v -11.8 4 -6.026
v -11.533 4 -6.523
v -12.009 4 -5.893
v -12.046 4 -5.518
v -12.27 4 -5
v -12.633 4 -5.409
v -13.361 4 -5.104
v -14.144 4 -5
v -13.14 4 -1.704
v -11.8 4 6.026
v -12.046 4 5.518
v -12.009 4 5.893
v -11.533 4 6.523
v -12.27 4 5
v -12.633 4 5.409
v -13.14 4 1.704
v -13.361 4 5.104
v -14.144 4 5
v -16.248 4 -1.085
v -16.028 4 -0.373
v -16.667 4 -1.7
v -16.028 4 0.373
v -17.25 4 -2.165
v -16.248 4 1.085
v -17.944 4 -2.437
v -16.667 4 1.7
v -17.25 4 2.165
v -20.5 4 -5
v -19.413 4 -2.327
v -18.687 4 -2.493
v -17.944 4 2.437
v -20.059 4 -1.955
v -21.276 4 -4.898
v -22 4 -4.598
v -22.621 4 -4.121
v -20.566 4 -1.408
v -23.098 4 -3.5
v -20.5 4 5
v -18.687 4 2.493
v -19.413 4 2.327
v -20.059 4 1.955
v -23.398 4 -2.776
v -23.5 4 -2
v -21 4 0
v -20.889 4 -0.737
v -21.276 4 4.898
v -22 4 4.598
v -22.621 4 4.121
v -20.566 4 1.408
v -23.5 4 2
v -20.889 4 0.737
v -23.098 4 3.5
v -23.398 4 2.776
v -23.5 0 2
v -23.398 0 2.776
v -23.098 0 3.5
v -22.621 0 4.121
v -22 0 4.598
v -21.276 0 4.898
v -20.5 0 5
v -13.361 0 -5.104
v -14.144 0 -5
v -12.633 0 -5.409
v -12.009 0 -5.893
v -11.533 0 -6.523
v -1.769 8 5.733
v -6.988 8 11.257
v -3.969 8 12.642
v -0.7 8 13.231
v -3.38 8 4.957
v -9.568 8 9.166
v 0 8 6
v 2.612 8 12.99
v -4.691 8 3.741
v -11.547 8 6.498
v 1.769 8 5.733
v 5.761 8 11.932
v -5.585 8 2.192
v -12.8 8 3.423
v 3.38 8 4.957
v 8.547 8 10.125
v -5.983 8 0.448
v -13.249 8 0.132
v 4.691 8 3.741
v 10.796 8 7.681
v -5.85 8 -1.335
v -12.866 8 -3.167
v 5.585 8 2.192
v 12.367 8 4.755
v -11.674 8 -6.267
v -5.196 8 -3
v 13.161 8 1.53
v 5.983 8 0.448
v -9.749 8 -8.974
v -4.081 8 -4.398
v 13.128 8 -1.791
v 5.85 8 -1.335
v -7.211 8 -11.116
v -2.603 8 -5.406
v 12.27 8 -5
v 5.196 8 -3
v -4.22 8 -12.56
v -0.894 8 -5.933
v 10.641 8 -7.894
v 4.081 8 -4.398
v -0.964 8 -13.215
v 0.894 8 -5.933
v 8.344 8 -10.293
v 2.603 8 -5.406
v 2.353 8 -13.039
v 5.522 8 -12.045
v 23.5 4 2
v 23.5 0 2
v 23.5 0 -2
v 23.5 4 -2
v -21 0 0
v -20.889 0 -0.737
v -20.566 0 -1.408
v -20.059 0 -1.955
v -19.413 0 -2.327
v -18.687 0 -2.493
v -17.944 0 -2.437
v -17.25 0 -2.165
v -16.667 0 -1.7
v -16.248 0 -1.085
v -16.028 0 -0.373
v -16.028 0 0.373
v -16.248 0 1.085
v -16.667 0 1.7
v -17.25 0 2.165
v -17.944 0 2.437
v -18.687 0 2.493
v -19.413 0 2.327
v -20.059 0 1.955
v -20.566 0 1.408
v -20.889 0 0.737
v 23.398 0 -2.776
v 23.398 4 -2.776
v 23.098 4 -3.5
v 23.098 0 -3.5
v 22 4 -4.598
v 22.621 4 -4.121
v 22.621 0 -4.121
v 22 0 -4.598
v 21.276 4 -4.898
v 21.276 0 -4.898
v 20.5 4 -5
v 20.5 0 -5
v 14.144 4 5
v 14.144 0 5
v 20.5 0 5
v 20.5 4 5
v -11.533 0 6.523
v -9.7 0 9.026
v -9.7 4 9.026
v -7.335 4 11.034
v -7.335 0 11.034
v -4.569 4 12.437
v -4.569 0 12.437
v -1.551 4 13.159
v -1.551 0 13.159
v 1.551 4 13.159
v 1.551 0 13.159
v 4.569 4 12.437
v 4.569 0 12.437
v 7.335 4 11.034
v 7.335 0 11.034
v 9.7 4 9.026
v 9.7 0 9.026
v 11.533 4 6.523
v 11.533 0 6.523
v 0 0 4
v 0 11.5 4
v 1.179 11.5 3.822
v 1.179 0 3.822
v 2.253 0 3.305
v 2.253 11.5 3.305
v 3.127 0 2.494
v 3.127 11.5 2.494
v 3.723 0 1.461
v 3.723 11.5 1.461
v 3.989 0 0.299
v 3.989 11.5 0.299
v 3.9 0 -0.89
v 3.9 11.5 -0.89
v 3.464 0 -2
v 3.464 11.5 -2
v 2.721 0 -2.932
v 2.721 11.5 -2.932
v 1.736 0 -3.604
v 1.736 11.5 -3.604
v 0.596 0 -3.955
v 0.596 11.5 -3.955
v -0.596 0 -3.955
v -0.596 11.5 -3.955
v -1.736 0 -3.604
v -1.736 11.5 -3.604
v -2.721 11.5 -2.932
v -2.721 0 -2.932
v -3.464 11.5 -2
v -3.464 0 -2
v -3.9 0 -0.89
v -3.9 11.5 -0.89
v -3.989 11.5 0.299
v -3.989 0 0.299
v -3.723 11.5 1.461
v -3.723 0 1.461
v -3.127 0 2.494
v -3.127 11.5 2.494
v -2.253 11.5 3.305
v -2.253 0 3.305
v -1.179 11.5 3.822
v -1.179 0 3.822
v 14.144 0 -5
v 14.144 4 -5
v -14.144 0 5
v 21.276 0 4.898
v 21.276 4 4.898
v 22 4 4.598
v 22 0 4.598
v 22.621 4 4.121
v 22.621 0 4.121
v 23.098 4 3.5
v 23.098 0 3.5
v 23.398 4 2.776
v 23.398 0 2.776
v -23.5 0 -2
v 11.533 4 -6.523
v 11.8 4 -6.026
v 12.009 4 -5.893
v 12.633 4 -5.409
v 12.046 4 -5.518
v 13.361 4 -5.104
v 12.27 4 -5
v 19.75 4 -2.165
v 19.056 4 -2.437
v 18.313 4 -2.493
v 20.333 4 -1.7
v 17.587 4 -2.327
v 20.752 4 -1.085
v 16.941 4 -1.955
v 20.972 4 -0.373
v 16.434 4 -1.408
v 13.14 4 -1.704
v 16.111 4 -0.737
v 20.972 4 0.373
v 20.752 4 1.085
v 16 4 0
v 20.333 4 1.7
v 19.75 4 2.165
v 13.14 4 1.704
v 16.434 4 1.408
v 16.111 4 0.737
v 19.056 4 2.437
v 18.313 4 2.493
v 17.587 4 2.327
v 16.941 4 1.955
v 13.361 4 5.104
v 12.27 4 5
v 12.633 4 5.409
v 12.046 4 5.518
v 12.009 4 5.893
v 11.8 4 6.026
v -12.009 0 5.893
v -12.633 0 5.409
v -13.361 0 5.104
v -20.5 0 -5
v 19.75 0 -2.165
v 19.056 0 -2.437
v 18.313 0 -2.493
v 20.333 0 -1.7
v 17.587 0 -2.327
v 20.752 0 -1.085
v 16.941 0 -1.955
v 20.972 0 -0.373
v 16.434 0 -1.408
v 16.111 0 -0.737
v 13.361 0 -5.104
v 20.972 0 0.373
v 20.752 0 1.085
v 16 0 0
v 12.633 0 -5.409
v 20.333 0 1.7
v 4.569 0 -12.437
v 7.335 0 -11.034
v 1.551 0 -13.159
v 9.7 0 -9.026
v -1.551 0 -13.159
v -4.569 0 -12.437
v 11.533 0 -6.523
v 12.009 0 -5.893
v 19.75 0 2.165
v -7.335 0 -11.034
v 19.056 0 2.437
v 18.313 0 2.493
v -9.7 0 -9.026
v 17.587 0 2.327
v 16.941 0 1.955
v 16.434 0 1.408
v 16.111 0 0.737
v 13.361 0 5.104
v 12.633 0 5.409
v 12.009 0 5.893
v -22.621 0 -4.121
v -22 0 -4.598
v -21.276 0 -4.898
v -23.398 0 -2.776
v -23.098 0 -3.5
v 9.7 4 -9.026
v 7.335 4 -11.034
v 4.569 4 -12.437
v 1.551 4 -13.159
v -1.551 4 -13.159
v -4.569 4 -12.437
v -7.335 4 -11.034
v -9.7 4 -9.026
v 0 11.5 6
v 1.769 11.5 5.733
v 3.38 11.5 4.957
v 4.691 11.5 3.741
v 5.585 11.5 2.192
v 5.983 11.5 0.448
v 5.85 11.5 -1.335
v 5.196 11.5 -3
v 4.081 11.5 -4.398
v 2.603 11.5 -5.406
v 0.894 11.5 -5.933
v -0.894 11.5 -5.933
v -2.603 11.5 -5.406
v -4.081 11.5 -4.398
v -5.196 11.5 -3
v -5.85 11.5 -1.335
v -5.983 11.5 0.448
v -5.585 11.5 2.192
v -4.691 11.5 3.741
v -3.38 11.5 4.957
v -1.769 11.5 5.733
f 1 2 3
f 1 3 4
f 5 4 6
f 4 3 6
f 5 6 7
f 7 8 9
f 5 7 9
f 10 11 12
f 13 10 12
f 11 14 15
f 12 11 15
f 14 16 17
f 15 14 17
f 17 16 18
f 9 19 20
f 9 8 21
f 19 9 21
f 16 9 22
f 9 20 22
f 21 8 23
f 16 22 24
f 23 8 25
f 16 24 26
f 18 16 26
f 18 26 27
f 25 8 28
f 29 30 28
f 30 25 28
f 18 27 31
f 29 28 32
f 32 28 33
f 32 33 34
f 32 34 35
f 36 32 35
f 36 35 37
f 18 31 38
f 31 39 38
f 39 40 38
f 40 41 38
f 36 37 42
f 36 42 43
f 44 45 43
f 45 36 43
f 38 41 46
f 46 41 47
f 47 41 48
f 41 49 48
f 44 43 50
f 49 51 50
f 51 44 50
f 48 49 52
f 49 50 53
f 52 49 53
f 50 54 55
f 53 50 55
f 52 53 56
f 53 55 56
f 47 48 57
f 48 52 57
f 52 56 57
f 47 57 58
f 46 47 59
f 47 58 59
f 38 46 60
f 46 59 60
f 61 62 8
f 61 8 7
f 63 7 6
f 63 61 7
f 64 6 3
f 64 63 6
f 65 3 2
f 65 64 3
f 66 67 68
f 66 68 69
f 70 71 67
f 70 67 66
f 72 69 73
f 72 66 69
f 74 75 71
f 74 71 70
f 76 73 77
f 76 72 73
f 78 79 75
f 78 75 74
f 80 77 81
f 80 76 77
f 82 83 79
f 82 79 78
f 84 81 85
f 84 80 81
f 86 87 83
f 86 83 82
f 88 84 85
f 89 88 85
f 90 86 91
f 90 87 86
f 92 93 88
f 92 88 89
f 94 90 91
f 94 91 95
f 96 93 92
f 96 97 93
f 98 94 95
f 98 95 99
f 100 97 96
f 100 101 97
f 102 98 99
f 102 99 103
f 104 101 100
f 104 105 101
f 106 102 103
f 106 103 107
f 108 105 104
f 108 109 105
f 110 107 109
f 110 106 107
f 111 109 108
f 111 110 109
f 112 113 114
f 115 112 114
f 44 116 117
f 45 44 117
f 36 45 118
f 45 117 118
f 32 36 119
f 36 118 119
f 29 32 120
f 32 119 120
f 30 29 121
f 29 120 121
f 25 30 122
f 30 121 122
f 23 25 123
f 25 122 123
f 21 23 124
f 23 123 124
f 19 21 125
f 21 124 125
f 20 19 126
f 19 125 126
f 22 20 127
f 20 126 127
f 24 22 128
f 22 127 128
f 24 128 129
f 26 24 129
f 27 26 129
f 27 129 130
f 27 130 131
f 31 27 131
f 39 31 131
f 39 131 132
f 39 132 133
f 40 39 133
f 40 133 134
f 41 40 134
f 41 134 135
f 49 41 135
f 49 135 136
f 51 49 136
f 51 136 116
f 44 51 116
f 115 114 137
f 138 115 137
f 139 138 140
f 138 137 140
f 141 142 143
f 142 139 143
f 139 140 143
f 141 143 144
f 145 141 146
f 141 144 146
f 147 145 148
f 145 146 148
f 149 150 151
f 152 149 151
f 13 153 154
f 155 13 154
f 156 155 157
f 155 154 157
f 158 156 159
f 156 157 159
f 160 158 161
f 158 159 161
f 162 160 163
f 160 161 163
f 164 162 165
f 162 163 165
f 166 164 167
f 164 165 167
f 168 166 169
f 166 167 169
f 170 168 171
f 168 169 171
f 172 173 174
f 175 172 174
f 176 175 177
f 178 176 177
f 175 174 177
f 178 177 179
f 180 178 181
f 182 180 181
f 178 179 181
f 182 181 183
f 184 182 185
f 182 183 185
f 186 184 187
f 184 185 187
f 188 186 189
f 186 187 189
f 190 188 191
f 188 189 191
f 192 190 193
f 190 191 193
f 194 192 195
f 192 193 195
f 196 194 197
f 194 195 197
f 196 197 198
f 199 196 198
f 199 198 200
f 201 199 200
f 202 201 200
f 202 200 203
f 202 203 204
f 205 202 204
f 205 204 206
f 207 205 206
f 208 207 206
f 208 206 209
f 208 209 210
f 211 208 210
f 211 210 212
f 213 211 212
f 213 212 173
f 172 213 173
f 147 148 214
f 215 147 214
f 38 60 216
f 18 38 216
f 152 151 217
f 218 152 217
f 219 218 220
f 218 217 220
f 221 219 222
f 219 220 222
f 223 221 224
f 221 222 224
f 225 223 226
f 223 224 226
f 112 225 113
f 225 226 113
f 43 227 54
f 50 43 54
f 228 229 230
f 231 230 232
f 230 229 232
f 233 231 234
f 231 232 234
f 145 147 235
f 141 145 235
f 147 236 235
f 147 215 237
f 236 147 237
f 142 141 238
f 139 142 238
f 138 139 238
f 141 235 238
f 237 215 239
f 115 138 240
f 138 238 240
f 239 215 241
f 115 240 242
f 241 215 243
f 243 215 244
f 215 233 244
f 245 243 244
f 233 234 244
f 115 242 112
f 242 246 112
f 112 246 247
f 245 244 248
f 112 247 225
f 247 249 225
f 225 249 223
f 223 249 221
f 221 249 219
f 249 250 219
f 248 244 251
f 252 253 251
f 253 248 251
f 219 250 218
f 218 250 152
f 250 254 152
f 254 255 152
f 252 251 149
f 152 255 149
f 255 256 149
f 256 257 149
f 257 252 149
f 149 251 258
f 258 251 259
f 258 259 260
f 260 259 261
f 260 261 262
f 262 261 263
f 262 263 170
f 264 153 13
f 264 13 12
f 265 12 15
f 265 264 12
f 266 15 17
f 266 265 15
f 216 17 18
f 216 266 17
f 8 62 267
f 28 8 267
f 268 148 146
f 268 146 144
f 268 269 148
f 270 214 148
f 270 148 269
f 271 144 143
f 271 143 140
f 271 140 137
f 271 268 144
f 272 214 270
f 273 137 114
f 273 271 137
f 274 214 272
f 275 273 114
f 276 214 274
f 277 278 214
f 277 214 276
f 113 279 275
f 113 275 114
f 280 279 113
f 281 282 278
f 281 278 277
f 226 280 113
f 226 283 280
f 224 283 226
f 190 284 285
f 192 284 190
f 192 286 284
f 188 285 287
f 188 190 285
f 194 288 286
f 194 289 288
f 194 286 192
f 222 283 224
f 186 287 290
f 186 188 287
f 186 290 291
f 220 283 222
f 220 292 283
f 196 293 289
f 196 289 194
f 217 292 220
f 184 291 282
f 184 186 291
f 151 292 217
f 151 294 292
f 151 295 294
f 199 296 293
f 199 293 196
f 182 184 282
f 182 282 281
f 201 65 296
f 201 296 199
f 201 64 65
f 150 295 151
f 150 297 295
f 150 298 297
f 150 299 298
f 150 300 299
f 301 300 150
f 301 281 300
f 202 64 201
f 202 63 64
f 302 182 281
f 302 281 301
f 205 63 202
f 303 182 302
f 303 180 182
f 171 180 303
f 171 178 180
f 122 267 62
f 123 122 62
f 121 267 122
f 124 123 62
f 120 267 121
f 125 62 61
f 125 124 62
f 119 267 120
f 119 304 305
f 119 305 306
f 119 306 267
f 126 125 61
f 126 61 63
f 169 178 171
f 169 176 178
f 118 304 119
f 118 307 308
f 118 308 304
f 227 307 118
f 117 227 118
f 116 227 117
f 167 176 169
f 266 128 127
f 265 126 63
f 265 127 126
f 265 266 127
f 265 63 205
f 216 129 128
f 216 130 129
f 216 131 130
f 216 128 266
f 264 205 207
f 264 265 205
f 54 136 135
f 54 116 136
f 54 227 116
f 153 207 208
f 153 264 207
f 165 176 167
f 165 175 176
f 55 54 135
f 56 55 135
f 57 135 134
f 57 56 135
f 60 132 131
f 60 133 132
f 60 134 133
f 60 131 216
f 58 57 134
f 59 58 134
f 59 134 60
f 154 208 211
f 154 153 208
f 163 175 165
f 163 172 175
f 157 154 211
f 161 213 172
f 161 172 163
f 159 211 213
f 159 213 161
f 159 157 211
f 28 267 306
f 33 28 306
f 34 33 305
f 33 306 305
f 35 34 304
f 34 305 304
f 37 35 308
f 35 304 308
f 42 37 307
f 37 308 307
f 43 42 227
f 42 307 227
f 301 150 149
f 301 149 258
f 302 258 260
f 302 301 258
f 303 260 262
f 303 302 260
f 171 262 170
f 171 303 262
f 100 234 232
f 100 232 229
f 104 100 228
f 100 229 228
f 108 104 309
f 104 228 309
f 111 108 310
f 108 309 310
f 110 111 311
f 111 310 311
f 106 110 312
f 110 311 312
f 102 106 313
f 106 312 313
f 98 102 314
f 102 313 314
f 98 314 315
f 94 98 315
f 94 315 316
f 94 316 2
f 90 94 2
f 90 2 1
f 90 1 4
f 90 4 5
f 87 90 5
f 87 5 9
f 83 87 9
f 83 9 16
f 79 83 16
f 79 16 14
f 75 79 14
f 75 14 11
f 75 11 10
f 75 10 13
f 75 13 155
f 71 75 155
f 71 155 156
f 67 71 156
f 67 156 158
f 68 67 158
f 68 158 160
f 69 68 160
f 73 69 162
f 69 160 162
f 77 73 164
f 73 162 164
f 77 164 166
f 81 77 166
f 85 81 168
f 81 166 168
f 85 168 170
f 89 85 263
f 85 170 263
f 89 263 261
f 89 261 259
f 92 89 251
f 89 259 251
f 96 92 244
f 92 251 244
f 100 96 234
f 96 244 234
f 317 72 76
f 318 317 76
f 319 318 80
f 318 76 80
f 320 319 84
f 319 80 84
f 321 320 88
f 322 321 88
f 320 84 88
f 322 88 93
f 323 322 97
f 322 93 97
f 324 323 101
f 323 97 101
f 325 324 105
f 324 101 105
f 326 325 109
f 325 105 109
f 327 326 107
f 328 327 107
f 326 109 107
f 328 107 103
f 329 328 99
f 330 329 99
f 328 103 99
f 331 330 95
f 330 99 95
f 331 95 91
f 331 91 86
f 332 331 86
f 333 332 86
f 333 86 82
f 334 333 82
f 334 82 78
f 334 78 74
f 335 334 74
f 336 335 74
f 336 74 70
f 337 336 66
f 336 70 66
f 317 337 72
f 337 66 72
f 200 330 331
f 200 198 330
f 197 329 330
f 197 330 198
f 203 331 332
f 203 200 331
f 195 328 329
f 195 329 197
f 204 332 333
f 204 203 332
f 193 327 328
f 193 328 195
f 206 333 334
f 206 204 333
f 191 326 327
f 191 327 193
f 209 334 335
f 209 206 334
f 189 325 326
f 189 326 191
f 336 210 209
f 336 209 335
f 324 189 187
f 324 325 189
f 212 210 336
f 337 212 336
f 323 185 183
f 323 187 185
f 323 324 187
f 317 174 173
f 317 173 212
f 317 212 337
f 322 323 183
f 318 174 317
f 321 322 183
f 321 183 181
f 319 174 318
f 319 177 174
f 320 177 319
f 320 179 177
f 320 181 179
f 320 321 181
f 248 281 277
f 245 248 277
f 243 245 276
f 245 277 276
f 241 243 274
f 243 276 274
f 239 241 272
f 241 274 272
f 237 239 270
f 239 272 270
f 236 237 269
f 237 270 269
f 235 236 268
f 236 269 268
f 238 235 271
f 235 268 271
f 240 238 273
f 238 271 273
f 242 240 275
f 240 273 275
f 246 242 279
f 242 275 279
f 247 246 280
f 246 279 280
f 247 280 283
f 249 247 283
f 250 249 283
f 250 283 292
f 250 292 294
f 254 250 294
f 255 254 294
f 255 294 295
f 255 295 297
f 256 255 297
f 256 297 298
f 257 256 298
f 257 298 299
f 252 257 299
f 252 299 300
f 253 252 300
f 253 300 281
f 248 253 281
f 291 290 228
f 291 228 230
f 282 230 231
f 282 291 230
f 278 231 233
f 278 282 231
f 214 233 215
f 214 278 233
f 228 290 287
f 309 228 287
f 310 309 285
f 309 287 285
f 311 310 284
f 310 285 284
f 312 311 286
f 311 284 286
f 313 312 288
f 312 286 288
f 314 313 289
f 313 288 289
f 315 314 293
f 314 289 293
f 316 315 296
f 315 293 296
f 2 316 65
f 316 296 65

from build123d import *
from build123d.topology import SkipClean

# Parameters (mm, degrees)
EXTRUDE_1_DEPTH     = 4
SKETCH_2_R          = 13.25
EXTRUDE_2_DEPTH     = 4
SKETCH_3_R          = 6
EXTRUDE_3_DEPTH     = 3.5
CUT_EXTRUDE_1_REACH = 31.327
SKETCH_4_R          = 4
FILLET_1_R          = 3
HOLE_WIZARD_1_D     = 5


with BuildPart() as part:
    # 草图1 → 凸台-拉伸1 (new body)
    with BuildSketch(Plane(origin=(0, 0, 0), x_dir=(1, 0, 0), z_dir=(0, 1, 0))):
        with BuildLine():
            Line((-3, 5), (-12.270391192, 5))
            ThreePointArc((-12.270391192, 5), (-13.25, 0), (-12.270391192, -5))
            Line((-12.270391192, -5), (-3, -5))
            Line((-3, -5), (-3, 5))
        make_face()
        with BuildLine():
            Line((-12.270391192, 5), (-23.5, 5))
            Line((-23.5, 5), (-23.5, -5))
            Line((-23.5, -5), (-12.270391192, -5))
            ThreePointArc((-12.270391192, -5), (-13.25, 0), (-12.270391192, 5))
        make_face()
        with BuildLine():
            ThreePointArc((12.270391192, 5), (0, 13.25), (-12.270391192, 5))
            Line((-12.270391192, 5), (-3, 5))
            Line((-3, 5), (-3, -5))
            Line((-3, -5), (-12.270391192, -5))
            ThreePointArc((-12.270391192, -5), (0, -13.25), (12.270391192, -5))
            Line((12.270391192, -5), (3, -5))
            Line((3, -5), (3, 5))
            Line((3, 5), (12.270391192, 5))
        make_face()
        with BuildLine():
            ThreePointArc((13.25, 0), (13.002791687, 2.547529853), (12.270391192, 5))
            Line((12.270391192, 5), (3, 5))
            Line((3, 5), (3, -5))
            Line((3, -5), (12.270391192, -5))
            ThreePointArc((12.270391192, -5), (13.002791687, -2.547529853), (13.25, 0))
        make_face()
        with BuildLine():
            Line((23.5, 5), (12.270391192, 5))
            ThreePointArc((12.270391192, 5), (13.002791687, 2.547529853), (13.25, 0))
            ThreePointArc((13.25, 0), (13.002791687, -2.547529853), (12.270391192, -5))
            Line((12.270391192, -5), (23.5, -5))
            Line((23.5, -5), (23.5, 5))
        make_face()
    extrude(amount=EXTRUDE_1_DEPTH)

    # 草图2 → 凸台-拉伸2 (add)
    with BuildSketch(Plane(origin=(0, 4, 0), x_dir=(1, 0, 0), z_dir=(0, 1, 0))):
        with Locations(Location((0, 0, 0), (0, 0, 22.170157164))):
            Circle(SKETCH_2_R)
    extrude(amount=EXTRUDE_2_DEPTH)

    # 草图3 → 凸台-拉伸3 (add)
    with SkipClean():  # the faces are left unmerged after this step: merging them gives an invalid solid
        with BuildSketch(Plane(origin=(0, 8, 0), x_dir=(1, 0, 0), z_dir=(0, 1, 0))):
            with Locations(Location((0, 0, 0), (0, 0, 270))):
                Circle(SKETCH_3_R)
        extrude(amount=EXTRUDE_3_DEPTH)

    # 草图4 → 切除-拉伸1 (cut, up to next)
    with BuildSketch(Plane(origin=(0, 11.5, 0), x_dir=(1, 0, 0), z_dir=(0, 1, 0)), mode=Mode.PRIVATE) as cut_extrude_1_sk1:
        with Locations(Location((0, 0, 0), (0, 0, 270))):
            Circle(SKETCH_4_R)
    cut_extrude_1_tool1 = extrude(cut_extrude_1_sk1.sketch, amount=-CUT_EXTRUDE_1_REACH, mode=Mode.PRIVATE) & part.part
    add(cut_extrude_1_tool1.solids().sort_by_distance((0, 11.5, 0))[0], mode=Mode.SUBTRACT)

    # 圆角1
    # the kernel refuses this fillet: 3 mm, written as the material it adds along each edge
    with BuildSketch(Plane(origin=(-12.270391192, 0, 5), x_dir=(-1, 0, 0), z_dir=(0, 1, 0))) as fillet_1_piece_1:
        with BuildLine():
            CenterArc((1.873953968, 3), FILLET_1_R, 209.492372675, 60.507627325)
            ThreePointArc((-0.737309754, 1.523076923), (-0.344316056, 0.773320696), (0, 0))
            Line((0, 0), (1.873953968, 0))
        make_face()
    extrude(amount=4)
    with BuildSketch(Plane(origin=(-12.270391192, 0, -5), x_dir=(0.43572231670003575, 0, -0.9000811423030447), z_dir=(0, 1, 0)), Plane(origin=(12.270391192, 0, 5), x_dir=(-0.4357223167001389, 0, 0.9000811423029949), z_dir=(0, 1, 0))) as fillet_1_piece_2:
        with BuildLine():
            CenterArc((1.883719863, 2.993877578), FILLET_1_R, 205.831264919, 60.507627325)
            Line((-0.816523564, 1.686710628), (0, 0))
            ThreePointArc((0, 0), (0.846077565, 0.027040696), (1.692155131, 0))
        make_face()
    extrude(amount=4)
    with BuildSketch(Plane(origin=(12.270391192, 0, -5), x_dir=(-0.43572231670013994, 0, -0.9000811423029943), z_dir=(0, 1, 0))) as fillet_1_piece_3:
        with BuildLine():
            CenterArc((1.883719863, -2.993877578), FILLET_1_R, 93.661107756, 60.507627325)
            Line((-0.816523564, -1.686710628), (0, 0))
            ThreePointArc((0, 0), (0.846077565, -0.027040696), (1.692155131, 0))
        make_face()
    extrude(amount=4)
    # the kernel refuses this fillet: 3 mm, written as the material it takes off along each edge
    with BuildSketch(Plane(origin=(-23.5, -7.5, 5), x_dir=(1, 0, 0), z_dir=(0, 1, 0)), Plane(origin=(23.5, -7.5, -5), x_dir=(-1, 0, 0), z_dir=(0, 1, 0)), Plane(origin=(23.5, -7.5, 5), x_dir=(0, 0, -1), z_dir=(0, 1, 0))) as fillet_1_2_piece_1:
        with BuildLine():
            CenterArc((FILLET_1_R, FILLET_1_R), FILLET_1_R, 180, 90)
            Line((0, FILLET_1_R), (0, 0))
            Line((0, 0), (FILLET_1_R, 0))
        make_face()
    extrude(amount=19, mode=Mode.SUBTRACT)
    with BuildSketch(Plane(origin=(-23.5, -7.5, -5), x_dir=(1, 0, 0), z_dir=(0, 1, 0))) as fillet_1_2_piece_2:
        with BuildLine():
            CenterArc((FILLET_1_R, -FILLET_1_R), FILLET_1_R, 90, 90)
            Line((0, -FILLET_1_R), (0, 0))
            Line((0, 0), (FILLET_1_R, 0))
        make_face()
    extrude(amount=19, mode=Mode.SUBTRACT)

    # 孔1 (through all)
    with Locations(Plane(origin=(0, 4, 0), x_dir=(1, 0, 0), z_dir=(0, 1, 0))):
        with Locations((-18.5, 0), (18.5, 0)):
            Hole(HOLE_WIZARD_1_D / 2)


solid = part.part
